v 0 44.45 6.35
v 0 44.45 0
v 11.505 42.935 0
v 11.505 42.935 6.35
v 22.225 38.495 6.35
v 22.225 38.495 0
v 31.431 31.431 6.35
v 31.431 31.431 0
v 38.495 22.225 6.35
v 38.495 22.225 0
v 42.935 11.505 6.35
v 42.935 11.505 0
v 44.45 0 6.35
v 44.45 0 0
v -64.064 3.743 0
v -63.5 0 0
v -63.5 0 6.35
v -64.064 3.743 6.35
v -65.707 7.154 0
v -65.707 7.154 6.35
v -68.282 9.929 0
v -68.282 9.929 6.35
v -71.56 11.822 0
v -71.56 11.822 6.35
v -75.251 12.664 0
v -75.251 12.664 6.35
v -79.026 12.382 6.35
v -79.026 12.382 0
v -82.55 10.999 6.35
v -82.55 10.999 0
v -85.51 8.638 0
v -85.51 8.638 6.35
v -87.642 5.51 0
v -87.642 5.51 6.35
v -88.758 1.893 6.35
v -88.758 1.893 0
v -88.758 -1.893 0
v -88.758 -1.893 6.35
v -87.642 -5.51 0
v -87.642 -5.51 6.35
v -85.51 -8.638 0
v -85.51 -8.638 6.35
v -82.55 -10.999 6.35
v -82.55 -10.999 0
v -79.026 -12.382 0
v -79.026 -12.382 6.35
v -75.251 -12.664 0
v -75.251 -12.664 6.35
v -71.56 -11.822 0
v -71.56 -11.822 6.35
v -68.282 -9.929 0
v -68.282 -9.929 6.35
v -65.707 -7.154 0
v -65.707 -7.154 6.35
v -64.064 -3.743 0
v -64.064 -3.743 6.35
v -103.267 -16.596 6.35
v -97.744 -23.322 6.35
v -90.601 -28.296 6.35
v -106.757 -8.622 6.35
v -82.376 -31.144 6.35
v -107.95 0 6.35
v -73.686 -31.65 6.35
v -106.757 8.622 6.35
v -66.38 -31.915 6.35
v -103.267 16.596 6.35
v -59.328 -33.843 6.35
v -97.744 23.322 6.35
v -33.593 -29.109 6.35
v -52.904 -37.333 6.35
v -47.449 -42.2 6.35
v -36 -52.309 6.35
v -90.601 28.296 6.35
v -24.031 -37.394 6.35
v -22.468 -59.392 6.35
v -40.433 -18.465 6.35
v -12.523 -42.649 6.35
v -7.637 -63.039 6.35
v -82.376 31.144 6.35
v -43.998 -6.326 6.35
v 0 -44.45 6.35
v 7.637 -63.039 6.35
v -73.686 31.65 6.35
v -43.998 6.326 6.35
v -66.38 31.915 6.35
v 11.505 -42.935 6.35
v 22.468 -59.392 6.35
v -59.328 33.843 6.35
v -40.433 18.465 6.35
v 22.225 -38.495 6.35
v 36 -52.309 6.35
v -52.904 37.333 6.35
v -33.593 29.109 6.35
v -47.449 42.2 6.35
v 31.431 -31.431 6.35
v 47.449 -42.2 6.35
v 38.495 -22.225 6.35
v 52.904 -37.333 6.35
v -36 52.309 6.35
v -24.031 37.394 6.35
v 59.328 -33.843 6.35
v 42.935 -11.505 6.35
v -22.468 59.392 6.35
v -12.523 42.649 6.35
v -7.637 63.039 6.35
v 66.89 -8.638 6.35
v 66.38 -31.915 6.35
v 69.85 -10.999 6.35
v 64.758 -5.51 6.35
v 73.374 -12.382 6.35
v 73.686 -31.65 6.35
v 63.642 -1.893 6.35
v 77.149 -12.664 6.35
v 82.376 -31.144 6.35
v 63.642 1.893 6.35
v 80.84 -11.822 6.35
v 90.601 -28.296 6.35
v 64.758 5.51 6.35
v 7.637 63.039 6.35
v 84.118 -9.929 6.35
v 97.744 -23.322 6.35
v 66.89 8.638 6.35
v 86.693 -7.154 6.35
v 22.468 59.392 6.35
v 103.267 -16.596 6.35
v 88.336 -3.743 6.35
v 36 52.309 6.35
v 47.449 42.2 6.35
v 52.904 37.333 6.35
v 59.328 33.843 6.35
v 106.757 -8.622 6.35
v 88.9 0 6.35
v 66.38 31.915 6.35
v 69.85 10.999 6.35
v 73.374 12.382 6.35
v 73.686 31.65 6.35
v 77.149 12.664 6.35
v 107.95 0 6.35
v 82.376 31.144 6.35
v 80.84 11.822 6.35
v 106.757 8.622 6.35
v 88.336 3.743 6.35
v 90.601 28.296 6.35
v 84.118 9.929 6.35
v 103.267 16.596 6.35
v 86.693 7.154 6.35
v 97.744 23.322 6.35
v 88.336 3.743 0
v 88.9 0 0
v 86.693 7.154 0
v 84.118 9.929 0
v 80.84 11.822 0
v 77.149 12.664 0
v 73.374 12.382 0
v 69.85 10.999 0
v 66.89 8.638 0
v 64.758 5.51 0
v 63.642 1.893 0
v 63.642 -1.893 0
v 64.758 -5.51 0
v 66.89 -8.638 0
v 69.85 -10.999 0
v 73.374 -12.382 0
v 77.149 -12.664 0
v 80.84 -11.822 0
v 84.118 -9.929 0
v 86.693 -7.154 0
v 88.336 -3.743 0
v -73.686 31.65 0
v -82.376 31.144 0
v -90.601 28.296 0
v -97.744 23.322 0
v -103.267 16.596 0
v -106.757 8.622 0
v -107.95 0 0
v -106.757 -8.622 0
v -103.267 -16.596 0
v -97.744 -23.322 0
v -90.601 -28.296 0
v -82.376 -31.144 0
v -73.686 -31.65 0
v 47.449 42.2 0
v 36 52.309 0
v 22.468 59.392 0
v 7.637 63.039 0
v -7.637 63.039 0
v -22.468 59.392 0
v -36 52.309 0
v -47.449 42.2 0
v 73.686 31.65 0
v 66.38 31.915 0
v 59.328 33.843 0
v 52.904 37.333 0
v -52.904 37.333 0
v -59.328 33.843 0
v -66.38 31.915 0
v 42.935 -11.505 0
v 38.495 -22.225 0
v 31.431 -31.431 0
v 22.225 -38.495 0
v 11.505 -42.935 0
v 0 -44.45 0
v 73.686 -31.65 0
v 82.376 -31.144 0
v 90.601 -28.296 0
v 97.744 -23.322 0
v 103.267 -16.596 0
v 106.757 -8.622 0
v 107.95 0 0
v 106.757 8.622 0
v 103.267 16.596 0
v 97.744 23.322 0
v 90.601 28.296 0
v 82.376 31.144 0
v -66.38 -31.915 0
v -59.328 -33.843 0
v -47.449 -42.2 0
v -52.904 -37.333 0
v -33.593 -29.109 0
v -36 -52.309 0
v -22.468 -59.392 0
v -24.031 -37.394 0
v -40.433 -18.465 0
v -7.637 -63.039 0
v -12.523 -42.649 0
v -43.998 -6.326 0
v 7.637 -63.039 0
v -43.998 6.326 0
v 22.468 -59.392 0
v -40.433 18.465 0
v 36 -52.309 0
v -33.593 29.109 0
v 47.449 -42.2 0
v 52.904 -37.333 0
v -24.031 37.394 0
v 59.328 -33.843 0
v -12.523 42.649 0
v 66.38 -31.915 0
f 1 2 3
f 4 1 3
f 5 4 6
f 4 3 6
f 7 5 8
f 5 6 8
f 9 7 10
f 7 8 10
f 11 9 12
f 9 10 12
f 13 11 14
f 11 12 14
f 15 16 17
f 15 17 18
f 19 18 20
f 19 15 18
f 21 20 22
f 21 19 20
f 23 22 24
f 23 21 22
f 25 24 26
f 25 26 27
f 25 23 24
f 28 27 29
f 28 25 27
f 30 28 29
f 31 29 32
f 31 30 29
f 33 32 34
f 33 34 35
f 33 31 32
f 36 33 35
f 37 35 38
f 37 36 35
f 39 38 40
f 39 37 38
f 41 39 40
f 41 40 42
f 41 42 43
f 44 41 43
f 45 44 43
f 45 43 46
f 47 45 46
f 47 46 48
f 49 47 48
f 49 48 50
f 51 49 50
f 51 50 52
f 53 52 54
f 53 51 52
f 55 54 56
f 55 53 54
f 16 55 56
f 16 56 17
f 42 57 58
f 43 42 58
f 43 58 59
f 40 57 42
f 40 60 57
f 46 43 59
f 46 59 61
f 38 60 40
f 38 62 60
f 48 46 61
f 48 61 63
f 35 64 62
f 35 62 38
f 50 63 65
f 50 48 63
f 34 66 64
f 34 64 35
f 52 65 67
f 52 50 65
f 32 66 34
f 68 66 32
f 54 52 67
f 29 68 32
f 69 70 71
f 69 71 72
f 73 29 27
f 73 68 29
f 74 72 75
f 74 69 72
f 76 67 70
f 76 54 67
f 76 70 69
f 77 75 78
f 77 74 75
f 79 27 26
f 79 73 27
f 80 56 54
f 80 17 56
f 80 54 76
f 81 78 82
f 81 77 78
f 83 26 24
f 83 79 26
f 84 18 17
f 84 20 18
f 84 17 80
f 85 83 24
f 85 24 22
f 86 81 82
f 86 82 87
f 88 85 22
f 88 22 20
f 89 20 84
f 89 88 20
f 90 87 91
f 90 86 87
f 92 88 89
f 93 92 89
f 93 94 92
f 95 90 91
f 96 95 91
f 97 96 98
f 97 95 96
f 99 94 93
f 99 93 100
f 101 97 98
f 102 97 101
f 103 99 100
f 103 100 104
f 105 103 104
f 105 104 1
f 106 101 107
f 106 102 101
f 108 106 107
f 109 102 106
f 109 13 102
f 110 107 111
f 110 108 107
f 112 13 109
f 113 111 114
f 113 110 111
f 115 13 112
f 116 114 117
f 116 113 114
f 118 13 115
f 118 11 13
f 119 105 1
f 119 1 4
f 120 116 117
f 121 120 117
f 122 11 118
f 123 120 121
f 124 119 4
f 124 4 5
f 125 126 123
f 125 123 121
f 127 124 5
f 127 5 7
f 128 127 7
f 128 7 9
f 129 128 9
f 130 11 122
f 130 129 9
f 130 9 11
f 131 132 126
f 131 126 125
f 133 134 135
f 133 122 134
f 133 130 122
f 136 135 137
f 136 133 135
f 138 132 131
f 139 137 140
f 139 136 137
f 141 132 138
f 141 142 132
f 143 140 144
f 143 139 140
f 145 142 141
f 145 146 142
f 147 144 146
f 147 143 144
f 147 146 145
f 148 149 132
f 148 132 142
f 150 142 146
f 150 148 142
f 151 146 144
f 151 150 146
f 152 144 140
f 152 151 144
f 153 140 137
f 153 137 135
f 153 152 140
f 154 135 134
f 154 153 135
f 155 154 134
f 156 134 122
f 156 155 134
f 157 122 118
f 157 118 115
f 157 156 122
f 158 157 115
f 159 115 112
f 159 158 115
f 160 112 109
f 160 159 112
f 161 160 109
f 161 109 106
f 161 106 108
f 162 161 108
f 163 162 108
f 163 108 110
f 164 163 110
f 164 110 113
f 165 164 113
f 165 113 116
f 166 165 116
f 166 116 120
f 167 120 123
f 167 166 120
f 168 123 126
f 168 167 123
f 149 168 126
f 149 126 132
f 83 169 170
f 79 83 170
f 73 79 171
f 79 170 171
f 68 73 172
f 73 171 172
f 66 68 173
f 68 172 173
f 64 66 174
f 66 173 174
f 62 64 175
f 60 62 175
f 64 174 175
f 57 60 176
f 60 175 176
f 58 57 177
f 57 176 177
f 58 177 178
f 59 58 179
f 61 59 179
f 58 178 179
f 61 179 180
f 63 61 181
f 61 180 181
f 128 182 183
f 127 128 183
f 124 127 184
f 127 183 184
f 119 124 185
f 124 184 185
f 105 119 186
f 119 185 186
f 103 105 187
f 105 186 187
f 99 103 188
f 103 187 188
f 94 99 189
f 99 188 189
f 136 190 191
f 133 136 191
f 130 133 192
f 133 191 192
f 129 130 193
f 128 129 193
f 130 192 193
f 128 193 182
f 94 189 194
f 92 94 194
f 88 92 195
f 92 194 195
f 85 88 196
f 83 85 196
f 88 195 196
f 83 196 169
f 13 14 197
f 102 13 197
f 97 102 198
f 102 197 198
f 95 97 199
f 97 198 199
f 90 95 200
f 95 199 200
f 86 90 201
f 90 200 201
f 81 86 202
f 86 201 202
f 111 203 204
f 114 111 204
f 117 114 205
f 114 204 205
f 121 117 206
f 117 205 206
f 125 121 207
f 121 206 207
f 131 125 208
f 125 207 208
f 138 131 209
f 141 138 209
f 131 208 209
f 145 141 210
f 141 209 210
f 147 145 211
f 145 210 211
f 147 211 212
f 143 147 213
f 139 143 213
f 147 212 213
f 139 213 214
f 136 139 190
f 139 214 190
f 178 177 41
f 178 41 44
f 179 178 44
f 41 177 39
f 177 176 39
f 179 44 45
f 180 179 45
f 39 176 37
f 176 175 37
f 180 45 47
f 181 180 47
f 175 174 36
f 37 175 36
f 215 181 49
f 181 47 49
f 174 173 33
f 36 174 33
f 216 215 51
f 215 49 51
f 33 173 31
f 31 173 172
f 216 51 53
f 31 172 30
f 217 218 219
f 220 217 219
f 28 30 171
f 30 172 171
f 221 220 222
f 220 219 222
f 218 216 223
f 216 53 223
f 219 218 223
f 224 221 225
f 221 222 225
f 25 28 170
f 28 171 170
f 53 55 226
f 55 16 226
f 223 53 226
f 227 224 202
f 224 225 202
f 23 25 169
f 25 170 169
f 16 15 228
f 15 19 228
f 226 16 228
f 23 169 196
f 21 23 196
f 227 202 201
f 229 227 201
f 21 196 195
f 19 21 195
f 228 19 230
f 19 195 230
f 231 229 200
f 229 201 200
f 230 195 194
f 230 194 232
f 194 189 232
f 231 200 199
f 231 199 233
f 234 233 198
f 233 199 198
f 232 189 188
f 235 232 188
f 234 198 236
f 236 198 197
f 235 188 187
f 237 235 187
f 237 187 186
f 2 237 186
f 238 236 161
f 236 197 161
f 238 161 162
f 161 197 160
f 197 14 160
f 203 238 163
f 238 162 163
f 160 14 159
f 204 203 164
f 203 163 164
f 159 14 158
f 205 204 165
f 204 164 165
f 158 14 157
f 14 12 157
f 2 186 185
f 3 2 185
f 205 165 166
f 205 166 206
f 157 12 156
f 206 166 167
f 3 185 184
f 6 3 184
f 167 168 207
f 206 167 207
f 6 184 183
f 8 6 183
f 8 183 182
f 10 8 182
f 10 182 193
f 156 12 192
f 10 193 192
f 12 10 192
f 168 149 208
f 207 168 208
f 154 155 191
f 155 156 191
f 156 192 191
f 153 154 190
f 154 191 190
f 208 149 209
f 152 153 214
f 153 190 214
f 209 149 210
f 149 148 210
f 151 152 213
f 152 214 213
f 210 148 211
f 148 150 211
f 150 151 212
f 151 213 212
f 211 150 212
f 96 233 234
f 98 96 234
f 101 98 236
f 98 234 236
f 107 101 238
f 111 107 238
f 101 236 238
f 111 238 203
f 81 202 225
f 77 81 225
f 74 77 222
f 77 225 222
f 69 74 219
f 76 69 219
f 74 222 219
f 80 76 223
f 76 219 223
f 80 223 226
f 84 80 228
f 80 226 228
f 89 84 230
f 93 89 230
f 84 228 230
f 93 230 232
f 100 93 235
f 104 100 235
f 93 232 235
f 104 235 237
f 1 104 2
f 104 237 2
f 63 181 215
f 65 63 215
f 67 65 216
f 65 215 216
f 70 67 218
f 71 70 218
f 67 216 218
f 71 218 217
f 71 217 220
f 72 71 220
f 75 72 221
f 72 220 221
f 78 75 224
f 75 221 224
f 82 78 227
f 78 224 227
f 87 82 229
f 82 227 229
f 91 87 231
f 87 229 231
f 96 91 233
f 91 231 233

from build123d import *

# Parameters (mm, degrees)
F0_R     = 12.7
F1_DEPTH = 6.35


# Not quite as in the source:
# - a length typed as a fraction of an inch, garbled in the dataset ("3 / 203.2 mm" for 3/8 in), is restored


with BuildPart() as f1:
    # F0 (on Top) → F1 (new body)
    with BuildSketch(Plane.XY):
        with BuildLine():
            ThreePointArc((-73.6864583333, -31.6503492602), (-59.3280711503, -33.8428959089), (-47.4486111111, -42.2004656802))
            ThreePointArc((-47.4486111111, -42.2004656802), (0, -63.5), (47.4486111111, -42.2004656802))
            ThreePointArc((47.4486111111, -42.2004656802), (59.3280711503, -33.8428959089), (73.6864583333, -31.6503492602))
            ThreePointArc((73.6864583333, -31.6503492602), (107.95, 0), (73.6864583333, 31.6503492602))
            ThreePointArc((73.6864583333, 31.6503492602), (59.3280711503, 33.8428959089), (47.4486111111, 42.2004656802))
            ThreePointArc((47.4486111111, 42.2004656802), (0, 63.5), (-47.4486111111, 42.2004656802))
            ThreePointArc((-47.4486111111, 42.2004656802), (-59.3280711503, 33.8428959089), (-73.6864583333, 31.6503492602))
            ThreePointArc((-73.6864583333, 31.6503492602), (-107.95, 0), (-73.6864583333, -31.6503492602))
        make_face()
        with Locations((-76.2, 0)):
            Circle(F0_R, mode=Mode.SUBTRACT)
        with BuildLine():
            ThreePointArc((0, 44.45), (31.4308964237, 31.4308964237), (44.45, 0))
            ThreePointArc((44.45, 0), (31.4308964237, -31.4308964237), (0, -44.45))
            ThreePointArc((0, -44.45), (-44.45, 0), (0, 44.45))
        make_face(mode=Mode.SUBTRACT)
        with Locations((76.2, 0)):
            Circle(F0_R, mode=Mode.SUBTRACT)
    extrude(amount=F1_DEPTH)


solid = f1.part
